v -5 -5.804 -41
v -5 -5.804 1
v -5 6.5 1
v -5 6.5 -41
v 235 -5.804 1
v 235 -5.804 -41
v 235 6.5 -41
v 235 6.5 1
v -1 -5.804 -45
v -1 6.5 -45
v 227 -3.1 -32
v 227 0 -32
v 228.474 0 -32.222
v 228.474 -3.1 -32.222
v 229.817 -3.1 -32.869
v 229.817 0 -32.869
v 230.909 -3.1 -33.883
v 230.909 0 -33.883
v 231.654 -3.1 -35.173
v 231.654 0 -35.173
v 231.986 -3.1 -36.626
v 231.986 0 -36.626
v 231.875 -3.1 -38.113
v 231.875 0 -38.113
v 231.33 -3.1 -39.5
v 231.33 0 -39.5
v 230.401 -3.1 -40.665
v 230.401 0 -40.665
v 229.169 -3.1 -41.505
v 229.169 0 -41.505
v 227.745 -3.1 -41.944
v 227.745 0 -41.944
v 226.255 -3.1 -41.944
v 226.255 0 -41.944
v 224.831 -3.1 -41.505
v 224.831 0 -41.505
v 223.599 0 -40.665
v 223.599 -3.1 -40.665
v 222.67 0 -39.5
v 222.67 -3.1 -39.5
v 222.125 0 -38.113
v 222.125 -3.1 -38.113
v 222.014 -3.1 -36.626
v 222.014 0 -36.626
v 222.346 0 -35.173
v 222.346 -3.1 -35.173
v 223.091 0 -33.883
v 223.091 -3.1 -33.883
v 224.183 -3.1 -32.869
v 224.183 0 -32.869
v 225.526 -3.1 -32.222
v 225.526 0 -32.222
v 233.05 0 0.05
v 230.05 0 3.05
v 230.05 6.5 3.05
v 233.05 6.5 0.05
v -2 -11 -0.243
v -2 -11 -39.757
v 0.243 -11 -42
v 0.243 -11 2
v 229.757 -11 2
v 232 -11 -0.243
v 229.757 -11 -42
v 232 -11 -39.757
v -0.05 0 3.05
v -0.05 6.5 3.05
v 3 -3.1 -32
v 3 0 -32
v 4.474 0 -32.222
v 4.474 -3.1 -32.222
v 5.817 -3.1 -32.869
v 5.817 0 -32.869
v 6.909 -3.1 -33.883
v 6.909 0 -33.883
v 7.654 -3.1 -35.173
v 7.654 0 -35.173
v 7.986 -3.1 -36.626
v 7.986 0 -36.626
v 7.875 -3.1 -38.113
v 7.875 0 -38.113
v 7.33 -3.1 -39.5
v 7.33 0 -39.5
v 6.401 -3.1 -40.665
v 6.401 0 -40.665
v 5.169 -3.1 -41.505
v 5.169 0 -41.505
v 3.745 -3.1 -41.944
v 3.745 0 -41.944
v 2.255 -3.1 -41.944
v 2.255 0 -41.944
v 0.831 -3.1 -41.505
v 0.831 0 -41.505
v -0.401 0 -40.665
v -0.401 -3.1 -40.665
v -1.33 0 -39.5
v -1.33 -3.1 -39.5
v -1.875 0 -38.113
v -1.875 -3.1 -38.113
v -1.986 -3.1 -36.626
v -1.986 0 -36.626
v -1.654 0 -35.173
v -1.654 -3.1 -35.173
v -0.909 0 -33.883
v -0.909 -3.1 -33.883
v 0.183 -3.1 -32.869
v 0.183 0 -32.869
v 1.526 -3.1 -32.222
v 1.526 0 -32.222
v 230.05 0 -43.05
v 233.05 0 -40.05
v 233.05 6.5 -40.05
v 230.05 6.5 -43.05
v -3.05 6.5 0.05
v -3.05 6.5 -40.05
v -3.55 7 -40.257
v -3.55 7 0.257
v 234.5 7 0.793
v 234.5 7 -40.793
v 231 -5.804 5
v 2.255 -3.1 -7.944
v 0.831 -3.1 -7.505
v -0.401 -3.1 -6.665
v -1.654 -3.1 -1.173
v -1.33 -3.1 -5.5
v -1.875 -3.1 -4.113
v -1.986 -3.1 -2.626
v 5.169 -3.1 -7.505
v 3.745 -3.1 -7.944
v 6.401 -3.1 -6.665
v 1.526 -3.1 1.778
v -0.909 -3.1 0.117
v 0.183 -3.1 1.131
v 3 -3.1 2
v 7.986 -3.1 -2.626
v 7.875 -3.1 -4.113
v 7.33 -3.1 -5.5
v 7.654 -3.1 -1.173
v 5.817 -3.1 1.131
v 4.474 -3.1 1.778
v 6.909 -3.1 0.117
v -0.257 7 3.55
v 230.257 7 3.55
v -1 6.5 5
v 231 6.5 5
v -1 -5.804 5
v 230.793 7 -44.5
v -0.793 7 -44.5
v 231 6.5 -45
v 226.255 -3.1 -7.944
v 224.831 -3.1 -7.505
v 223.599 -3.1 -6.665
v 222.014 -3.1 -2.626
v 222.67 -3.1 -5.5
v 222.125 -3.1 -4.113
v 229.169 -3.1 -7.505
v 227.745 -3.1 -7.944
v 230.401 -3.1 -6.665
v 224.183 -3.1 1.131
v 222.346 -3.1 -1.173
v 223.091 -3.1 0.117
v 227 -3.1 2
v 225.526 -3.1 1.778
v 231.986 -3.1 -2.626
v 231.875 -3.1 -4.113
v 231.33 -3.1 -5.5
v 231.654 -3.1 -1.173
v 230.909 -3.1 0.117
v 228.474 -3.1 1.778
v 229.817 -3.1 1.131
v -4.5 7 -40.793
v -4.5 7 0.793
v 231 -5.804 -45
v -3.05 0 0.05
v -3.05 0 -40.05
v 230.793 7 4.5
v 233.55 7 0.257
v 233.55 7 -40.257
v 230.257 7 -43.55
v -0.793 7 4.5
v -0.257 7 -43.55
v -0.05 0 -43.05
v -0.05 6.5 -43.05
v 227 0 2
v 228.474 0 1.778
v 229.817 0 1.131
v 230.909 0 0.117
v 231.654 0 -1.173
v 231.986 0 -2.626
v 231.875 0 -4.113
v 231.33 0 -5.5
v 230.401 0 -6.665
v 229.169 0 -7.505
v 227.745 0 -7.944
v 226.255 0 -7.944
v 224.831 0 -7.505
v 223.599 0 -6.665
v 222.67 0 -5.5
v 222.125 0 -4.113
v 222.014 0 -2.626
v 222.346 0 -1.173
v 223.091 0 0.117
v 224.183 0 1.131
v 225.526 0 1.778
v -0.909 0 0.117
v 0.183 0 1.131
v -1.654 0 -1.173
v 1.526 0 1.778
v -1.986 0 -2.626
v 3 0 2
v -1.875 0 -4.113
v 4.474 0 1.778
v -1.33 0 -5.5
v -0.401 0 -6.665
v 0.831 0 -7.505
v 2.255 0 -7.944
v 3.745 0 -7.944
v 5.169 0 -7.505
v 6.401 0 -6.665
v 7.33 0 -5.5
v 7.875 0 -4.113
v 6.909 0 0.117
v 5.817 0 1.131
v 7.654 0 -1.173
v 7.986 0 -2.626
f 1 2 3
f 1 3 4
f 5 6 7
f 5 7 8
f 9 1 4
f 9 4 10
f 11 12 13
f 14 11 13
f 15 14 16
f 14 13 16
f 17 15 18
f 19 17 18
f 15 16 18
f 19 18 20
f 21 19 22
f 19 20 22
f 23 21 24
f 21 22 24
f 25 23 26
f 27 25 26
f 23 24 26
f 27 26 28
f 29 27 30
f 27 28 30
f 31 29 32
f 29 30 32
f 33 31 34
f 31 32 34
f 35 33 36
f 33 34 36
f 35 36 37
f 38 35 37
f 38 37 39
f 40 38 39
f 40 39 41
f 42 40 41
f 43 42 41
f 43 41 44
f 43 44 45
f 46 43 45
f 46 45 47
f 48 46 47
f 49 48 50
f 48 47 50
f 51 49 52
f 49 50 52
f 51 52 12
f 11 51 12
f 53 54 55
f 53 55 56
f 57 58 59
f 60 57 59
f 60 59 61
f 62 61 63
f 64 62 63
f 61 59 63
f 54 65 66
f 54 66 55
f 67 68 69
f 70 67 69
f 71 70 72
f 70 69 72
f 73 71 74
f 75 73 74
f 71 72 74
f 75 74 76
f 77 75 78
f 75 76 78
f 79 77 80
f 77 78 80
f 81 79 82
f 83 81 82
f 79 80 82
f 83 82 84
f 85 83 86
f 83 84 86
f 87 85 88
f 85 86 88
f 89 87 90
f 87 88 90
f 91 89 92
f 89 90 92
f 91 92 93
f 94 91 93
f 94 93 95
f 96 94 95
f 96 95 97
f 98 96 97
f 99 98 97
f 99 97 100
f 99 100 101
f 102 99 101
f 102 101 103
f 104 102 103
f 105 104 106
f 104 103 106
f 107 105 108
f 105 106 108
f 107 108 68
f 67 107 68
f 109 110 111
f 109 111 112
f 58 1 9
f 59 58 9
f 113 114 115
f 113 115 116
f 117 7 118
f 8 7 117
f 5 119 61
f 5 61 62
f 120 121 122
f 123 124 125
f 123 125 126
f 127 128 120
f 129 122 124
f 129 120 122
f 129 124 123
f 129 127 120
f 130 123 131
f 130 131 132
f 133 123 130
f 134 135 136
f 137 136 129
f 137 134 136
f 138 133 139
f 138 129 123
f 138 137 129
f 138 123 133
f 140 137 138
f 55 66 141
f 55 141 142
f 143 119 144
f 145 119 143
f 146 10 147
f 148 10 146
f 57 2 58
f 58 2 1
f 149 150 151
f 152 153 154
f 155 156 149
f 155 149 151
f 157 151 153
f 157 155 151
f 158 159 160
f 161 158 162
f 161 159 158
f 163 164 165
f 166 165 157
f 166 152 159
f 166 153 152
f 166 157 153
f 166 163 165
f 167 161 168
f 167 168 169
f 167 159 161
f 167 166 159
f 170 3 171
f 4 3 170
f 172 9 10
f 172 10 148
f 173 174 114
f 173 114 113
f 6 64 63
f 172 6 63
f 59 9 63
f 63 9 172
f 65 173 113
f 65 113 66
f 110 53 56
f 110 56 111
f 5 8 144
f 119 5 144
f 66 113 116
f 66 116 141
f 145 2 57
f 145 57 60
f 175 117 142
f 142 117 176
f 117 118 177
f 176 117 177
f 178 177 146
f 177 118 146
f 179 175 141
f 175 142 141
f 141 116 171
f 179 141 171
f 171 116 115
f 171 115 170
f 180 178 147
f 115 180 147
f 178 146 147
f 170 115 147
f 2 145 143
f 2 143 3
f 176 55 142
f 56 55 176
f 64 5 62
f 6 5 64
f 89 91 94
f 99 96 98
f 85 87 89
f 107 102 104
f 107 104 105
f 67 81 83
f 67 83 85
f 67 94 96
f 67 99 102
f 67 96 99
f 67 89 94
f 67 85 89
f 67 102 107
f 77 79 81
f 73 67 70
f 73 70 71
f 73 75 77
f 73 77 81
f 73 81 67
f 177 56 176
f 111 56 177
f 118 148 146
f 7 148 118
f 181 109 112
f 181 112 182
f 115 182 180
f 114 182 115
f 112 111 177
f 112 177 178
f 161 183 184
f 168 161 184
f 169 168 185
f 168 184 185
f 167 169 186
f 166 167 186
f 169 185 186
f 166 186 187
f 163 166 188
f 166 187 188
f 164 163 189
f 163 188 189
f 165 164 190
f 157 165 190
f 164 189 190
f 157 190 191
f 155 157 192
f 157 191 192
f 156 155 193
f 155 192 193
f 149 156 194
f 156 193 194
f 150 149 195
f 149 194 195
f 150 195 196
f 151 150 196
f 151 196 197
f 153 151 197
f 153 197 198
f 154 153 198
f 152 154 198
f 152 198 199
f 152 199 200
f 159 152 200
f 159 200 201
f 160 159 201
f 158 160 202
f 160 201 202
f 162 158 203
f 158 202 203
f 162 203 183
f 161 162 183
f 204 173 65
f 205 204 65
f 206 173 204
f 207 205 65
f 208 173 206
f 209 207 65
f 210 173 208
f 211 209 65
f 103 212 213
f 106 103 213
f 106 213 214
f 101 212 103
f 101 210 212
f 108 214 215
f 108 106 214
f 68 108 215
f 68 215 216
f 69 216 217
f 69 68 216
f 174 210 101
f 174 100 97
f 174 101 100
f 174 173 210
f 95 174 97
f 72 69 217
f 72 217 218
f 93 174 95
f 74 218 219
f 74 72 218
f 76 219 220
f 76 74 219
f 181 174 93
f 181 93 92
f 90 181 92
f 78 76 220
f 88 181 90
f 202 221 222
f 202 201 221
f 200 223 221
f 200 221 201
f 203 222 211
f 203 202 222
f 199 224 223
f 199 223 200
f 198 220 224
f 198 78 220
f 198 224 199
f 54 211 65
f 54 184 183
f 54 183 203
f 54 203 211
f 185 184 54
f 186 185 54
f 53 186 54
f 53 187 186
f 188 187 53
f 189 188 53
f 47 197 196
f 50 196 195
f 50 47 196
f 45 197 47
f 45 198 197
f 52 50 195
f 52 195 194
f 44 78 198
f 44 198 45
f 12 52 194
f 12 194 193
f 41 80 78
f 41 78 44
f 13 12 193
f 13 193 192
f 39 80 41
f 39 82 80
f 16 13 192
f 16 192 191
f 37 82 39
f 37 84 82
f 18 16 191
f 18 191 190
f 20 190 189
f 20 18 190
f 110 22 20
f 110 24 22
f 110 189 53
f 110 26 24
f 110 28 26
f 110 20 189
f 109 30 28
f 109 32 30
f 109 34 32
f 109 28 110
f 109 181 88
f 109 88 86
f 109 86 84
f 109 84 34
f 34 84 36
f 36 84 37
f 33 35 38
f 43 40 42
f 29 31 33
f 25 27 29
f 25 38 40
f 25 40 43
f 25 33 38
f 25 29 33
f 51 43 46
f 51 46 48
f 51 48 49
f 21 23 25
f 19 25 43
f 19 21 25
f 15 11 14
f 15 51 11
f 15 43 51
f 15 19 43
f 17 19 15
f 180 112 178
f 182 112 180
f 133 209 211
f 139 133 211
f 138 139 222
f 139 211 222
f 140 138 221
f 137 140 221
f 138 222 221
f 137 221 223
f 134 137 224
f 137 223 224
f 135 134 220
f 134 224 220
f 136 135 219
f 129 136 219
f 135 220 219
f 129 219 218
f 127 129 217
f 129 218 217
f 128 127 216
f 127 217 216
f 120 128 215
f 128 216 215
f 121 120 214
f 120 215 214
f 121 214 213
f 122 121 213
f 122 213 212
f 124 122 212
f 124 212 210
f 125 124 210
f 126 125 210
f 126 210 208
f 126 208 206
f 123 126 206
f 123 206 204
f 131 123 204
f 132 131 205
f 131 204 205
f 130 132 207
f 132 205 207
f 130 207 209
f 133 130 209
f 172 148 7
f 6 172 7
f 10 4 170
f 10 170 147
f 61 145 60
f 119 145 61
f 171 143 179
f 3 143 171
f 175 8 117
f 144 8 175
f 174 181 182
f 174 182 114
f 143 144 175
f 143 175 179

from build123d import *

# Parameters (mm, degrees)
SKETCH1_W           = 240
SKETCH1_H           = 50
BOSS_EXTRUDE1_DEPTH = 11
CHAMFER5_SIZE       = 4
SKETCH6_R           = 5
CUT_EXTRUDE5_DEPTH  = 3.1
CHAMFER9_SIZE       = 3
CHAMFER9_SIZE2      = 5.196152423
BOSS_EXTRUDE4_DEPTH = 7
CHAMFER13_SIZE      = 0.5
CHAMFER14_SIZE      = 0.5


with BuildPart() as part:
    # Sketch1 → Boss-Extrude1 (new body)
    with BuildSketch(Plane(origin=(0, 0, 0), x_dir=(1, 0, 0), z_dir=(0, 1, 0))):
        with Locations((115, 20)):
            Rectangle(SKETCH1_W, SKETCH1_H)
    extrude(amount=-BOSS_EXTRUDE1_DEPTH)

    # Chamfer5
    chamfer5_edges = [part.edges().sort_by_distance(p)[0] for p in [
        (235, -5.5, 5),
        (-5, -5.5, 5),
        (-5, -5.5, -45),
        (235, -5.5, -45),
    ]]
    chamfer(chamfer5_edges, length=CHAMFER5_SIZE)

    # Sketch6 → Cut-Extrude5 (cut)
    with BuildSketch(Plane(origin=(0, 0, 0), x_dir=(1, 0, 0), z_dir=(0, 1, 0))):
        with Locations((3, 37)):
            Circle(SKETCH6_R)
        with Locations((227, 37)):
            Circle(SKETCH6_R)
        with Locations((227, 3)):
            Circle(SKETCH6_R)
        with Locations((3, 3)):
            Circle(SKETCH6_R)
    extrude(amount=-CUT_EXTRUDE5_DEPTH, mode=Mode.SUBTRACT)

    # Chamfer9
    chamfer9_edges = [part.edges().sort_by_distance(p)[0] for p in [
        (-3, -11, 3),
        (115, -11, 5),
        (233, -11, 3),
        (235, -11, -20),
        (233, -11, -43),
        (115, -11, -45),
        (-3, -11, -43),
        (-5, -11, -20),
    ]]
    chamfer9_side = [part.faces().sort_by_distance(p)[0] for p in [
        (115, -11, -20),
    ]]
    chamfer(chamfer9_edges, length=CHAMFER9_SIZE, length2=CHAMFER9_SIZE2, reference=chamfer9_side[0])

    # Sketch8 → Boss-Extrude4 (add)
    with BuildSketch(Plane(origin=(0, 0, 0), x_dir=(1, 0, 0), z_dir=(0, 1, 0))):
        Polygon((-5, 41), (-1, 45), (231, 45), (235, 41), (235, -1), (231, -5), (-1, -5), (-5, -1), align=None)
        Polygon((-3.05, -0.05), (-0.05, -3.05), (230.05, -3.05), (233.05, -0.05), (233.05, 40.05), (230.05, 43.05), (-0.05, 43.05), (-3.05, 40.05), align=None, mode=Mode.SUBTRACT)
    extrude(amount=BOSS_EXTRUDE4_DEPTH)

    # Chamfer13
    chamfer13_edges = [part.edges().sort_by_distance(p)[0] for p in [
        (231.55, 7, 1.55),
        (115, 7, 3.05),
        (-1.55, 7, 1.55),
        (231.55, 7, -41.55),
        (115, 7, -43.05),
        (-1.55, 7, -41.55),
        (-3.05, 7, -20),
        (233.05, 7, -20),
    ]]
    chamfer(chamfer13_edges, length=CHAMFER13_SIZE)

    # Chamfer14
    chamfer14_edges = [part.edges().sort_by_distance(p)[0] for p in [
        (-3, 7, 3),
        (115, 7, 5),
        (233, 7, 3),
        (235, 7, -20),
        (233, 7, -43),
        (115, 7, -45),
        (-3, 7, -43),
        (-5, 7, -20),
    ]]
    chamfer(chamfer14_edges, length=CHAMFER14_SIZE)


solid = part.part
